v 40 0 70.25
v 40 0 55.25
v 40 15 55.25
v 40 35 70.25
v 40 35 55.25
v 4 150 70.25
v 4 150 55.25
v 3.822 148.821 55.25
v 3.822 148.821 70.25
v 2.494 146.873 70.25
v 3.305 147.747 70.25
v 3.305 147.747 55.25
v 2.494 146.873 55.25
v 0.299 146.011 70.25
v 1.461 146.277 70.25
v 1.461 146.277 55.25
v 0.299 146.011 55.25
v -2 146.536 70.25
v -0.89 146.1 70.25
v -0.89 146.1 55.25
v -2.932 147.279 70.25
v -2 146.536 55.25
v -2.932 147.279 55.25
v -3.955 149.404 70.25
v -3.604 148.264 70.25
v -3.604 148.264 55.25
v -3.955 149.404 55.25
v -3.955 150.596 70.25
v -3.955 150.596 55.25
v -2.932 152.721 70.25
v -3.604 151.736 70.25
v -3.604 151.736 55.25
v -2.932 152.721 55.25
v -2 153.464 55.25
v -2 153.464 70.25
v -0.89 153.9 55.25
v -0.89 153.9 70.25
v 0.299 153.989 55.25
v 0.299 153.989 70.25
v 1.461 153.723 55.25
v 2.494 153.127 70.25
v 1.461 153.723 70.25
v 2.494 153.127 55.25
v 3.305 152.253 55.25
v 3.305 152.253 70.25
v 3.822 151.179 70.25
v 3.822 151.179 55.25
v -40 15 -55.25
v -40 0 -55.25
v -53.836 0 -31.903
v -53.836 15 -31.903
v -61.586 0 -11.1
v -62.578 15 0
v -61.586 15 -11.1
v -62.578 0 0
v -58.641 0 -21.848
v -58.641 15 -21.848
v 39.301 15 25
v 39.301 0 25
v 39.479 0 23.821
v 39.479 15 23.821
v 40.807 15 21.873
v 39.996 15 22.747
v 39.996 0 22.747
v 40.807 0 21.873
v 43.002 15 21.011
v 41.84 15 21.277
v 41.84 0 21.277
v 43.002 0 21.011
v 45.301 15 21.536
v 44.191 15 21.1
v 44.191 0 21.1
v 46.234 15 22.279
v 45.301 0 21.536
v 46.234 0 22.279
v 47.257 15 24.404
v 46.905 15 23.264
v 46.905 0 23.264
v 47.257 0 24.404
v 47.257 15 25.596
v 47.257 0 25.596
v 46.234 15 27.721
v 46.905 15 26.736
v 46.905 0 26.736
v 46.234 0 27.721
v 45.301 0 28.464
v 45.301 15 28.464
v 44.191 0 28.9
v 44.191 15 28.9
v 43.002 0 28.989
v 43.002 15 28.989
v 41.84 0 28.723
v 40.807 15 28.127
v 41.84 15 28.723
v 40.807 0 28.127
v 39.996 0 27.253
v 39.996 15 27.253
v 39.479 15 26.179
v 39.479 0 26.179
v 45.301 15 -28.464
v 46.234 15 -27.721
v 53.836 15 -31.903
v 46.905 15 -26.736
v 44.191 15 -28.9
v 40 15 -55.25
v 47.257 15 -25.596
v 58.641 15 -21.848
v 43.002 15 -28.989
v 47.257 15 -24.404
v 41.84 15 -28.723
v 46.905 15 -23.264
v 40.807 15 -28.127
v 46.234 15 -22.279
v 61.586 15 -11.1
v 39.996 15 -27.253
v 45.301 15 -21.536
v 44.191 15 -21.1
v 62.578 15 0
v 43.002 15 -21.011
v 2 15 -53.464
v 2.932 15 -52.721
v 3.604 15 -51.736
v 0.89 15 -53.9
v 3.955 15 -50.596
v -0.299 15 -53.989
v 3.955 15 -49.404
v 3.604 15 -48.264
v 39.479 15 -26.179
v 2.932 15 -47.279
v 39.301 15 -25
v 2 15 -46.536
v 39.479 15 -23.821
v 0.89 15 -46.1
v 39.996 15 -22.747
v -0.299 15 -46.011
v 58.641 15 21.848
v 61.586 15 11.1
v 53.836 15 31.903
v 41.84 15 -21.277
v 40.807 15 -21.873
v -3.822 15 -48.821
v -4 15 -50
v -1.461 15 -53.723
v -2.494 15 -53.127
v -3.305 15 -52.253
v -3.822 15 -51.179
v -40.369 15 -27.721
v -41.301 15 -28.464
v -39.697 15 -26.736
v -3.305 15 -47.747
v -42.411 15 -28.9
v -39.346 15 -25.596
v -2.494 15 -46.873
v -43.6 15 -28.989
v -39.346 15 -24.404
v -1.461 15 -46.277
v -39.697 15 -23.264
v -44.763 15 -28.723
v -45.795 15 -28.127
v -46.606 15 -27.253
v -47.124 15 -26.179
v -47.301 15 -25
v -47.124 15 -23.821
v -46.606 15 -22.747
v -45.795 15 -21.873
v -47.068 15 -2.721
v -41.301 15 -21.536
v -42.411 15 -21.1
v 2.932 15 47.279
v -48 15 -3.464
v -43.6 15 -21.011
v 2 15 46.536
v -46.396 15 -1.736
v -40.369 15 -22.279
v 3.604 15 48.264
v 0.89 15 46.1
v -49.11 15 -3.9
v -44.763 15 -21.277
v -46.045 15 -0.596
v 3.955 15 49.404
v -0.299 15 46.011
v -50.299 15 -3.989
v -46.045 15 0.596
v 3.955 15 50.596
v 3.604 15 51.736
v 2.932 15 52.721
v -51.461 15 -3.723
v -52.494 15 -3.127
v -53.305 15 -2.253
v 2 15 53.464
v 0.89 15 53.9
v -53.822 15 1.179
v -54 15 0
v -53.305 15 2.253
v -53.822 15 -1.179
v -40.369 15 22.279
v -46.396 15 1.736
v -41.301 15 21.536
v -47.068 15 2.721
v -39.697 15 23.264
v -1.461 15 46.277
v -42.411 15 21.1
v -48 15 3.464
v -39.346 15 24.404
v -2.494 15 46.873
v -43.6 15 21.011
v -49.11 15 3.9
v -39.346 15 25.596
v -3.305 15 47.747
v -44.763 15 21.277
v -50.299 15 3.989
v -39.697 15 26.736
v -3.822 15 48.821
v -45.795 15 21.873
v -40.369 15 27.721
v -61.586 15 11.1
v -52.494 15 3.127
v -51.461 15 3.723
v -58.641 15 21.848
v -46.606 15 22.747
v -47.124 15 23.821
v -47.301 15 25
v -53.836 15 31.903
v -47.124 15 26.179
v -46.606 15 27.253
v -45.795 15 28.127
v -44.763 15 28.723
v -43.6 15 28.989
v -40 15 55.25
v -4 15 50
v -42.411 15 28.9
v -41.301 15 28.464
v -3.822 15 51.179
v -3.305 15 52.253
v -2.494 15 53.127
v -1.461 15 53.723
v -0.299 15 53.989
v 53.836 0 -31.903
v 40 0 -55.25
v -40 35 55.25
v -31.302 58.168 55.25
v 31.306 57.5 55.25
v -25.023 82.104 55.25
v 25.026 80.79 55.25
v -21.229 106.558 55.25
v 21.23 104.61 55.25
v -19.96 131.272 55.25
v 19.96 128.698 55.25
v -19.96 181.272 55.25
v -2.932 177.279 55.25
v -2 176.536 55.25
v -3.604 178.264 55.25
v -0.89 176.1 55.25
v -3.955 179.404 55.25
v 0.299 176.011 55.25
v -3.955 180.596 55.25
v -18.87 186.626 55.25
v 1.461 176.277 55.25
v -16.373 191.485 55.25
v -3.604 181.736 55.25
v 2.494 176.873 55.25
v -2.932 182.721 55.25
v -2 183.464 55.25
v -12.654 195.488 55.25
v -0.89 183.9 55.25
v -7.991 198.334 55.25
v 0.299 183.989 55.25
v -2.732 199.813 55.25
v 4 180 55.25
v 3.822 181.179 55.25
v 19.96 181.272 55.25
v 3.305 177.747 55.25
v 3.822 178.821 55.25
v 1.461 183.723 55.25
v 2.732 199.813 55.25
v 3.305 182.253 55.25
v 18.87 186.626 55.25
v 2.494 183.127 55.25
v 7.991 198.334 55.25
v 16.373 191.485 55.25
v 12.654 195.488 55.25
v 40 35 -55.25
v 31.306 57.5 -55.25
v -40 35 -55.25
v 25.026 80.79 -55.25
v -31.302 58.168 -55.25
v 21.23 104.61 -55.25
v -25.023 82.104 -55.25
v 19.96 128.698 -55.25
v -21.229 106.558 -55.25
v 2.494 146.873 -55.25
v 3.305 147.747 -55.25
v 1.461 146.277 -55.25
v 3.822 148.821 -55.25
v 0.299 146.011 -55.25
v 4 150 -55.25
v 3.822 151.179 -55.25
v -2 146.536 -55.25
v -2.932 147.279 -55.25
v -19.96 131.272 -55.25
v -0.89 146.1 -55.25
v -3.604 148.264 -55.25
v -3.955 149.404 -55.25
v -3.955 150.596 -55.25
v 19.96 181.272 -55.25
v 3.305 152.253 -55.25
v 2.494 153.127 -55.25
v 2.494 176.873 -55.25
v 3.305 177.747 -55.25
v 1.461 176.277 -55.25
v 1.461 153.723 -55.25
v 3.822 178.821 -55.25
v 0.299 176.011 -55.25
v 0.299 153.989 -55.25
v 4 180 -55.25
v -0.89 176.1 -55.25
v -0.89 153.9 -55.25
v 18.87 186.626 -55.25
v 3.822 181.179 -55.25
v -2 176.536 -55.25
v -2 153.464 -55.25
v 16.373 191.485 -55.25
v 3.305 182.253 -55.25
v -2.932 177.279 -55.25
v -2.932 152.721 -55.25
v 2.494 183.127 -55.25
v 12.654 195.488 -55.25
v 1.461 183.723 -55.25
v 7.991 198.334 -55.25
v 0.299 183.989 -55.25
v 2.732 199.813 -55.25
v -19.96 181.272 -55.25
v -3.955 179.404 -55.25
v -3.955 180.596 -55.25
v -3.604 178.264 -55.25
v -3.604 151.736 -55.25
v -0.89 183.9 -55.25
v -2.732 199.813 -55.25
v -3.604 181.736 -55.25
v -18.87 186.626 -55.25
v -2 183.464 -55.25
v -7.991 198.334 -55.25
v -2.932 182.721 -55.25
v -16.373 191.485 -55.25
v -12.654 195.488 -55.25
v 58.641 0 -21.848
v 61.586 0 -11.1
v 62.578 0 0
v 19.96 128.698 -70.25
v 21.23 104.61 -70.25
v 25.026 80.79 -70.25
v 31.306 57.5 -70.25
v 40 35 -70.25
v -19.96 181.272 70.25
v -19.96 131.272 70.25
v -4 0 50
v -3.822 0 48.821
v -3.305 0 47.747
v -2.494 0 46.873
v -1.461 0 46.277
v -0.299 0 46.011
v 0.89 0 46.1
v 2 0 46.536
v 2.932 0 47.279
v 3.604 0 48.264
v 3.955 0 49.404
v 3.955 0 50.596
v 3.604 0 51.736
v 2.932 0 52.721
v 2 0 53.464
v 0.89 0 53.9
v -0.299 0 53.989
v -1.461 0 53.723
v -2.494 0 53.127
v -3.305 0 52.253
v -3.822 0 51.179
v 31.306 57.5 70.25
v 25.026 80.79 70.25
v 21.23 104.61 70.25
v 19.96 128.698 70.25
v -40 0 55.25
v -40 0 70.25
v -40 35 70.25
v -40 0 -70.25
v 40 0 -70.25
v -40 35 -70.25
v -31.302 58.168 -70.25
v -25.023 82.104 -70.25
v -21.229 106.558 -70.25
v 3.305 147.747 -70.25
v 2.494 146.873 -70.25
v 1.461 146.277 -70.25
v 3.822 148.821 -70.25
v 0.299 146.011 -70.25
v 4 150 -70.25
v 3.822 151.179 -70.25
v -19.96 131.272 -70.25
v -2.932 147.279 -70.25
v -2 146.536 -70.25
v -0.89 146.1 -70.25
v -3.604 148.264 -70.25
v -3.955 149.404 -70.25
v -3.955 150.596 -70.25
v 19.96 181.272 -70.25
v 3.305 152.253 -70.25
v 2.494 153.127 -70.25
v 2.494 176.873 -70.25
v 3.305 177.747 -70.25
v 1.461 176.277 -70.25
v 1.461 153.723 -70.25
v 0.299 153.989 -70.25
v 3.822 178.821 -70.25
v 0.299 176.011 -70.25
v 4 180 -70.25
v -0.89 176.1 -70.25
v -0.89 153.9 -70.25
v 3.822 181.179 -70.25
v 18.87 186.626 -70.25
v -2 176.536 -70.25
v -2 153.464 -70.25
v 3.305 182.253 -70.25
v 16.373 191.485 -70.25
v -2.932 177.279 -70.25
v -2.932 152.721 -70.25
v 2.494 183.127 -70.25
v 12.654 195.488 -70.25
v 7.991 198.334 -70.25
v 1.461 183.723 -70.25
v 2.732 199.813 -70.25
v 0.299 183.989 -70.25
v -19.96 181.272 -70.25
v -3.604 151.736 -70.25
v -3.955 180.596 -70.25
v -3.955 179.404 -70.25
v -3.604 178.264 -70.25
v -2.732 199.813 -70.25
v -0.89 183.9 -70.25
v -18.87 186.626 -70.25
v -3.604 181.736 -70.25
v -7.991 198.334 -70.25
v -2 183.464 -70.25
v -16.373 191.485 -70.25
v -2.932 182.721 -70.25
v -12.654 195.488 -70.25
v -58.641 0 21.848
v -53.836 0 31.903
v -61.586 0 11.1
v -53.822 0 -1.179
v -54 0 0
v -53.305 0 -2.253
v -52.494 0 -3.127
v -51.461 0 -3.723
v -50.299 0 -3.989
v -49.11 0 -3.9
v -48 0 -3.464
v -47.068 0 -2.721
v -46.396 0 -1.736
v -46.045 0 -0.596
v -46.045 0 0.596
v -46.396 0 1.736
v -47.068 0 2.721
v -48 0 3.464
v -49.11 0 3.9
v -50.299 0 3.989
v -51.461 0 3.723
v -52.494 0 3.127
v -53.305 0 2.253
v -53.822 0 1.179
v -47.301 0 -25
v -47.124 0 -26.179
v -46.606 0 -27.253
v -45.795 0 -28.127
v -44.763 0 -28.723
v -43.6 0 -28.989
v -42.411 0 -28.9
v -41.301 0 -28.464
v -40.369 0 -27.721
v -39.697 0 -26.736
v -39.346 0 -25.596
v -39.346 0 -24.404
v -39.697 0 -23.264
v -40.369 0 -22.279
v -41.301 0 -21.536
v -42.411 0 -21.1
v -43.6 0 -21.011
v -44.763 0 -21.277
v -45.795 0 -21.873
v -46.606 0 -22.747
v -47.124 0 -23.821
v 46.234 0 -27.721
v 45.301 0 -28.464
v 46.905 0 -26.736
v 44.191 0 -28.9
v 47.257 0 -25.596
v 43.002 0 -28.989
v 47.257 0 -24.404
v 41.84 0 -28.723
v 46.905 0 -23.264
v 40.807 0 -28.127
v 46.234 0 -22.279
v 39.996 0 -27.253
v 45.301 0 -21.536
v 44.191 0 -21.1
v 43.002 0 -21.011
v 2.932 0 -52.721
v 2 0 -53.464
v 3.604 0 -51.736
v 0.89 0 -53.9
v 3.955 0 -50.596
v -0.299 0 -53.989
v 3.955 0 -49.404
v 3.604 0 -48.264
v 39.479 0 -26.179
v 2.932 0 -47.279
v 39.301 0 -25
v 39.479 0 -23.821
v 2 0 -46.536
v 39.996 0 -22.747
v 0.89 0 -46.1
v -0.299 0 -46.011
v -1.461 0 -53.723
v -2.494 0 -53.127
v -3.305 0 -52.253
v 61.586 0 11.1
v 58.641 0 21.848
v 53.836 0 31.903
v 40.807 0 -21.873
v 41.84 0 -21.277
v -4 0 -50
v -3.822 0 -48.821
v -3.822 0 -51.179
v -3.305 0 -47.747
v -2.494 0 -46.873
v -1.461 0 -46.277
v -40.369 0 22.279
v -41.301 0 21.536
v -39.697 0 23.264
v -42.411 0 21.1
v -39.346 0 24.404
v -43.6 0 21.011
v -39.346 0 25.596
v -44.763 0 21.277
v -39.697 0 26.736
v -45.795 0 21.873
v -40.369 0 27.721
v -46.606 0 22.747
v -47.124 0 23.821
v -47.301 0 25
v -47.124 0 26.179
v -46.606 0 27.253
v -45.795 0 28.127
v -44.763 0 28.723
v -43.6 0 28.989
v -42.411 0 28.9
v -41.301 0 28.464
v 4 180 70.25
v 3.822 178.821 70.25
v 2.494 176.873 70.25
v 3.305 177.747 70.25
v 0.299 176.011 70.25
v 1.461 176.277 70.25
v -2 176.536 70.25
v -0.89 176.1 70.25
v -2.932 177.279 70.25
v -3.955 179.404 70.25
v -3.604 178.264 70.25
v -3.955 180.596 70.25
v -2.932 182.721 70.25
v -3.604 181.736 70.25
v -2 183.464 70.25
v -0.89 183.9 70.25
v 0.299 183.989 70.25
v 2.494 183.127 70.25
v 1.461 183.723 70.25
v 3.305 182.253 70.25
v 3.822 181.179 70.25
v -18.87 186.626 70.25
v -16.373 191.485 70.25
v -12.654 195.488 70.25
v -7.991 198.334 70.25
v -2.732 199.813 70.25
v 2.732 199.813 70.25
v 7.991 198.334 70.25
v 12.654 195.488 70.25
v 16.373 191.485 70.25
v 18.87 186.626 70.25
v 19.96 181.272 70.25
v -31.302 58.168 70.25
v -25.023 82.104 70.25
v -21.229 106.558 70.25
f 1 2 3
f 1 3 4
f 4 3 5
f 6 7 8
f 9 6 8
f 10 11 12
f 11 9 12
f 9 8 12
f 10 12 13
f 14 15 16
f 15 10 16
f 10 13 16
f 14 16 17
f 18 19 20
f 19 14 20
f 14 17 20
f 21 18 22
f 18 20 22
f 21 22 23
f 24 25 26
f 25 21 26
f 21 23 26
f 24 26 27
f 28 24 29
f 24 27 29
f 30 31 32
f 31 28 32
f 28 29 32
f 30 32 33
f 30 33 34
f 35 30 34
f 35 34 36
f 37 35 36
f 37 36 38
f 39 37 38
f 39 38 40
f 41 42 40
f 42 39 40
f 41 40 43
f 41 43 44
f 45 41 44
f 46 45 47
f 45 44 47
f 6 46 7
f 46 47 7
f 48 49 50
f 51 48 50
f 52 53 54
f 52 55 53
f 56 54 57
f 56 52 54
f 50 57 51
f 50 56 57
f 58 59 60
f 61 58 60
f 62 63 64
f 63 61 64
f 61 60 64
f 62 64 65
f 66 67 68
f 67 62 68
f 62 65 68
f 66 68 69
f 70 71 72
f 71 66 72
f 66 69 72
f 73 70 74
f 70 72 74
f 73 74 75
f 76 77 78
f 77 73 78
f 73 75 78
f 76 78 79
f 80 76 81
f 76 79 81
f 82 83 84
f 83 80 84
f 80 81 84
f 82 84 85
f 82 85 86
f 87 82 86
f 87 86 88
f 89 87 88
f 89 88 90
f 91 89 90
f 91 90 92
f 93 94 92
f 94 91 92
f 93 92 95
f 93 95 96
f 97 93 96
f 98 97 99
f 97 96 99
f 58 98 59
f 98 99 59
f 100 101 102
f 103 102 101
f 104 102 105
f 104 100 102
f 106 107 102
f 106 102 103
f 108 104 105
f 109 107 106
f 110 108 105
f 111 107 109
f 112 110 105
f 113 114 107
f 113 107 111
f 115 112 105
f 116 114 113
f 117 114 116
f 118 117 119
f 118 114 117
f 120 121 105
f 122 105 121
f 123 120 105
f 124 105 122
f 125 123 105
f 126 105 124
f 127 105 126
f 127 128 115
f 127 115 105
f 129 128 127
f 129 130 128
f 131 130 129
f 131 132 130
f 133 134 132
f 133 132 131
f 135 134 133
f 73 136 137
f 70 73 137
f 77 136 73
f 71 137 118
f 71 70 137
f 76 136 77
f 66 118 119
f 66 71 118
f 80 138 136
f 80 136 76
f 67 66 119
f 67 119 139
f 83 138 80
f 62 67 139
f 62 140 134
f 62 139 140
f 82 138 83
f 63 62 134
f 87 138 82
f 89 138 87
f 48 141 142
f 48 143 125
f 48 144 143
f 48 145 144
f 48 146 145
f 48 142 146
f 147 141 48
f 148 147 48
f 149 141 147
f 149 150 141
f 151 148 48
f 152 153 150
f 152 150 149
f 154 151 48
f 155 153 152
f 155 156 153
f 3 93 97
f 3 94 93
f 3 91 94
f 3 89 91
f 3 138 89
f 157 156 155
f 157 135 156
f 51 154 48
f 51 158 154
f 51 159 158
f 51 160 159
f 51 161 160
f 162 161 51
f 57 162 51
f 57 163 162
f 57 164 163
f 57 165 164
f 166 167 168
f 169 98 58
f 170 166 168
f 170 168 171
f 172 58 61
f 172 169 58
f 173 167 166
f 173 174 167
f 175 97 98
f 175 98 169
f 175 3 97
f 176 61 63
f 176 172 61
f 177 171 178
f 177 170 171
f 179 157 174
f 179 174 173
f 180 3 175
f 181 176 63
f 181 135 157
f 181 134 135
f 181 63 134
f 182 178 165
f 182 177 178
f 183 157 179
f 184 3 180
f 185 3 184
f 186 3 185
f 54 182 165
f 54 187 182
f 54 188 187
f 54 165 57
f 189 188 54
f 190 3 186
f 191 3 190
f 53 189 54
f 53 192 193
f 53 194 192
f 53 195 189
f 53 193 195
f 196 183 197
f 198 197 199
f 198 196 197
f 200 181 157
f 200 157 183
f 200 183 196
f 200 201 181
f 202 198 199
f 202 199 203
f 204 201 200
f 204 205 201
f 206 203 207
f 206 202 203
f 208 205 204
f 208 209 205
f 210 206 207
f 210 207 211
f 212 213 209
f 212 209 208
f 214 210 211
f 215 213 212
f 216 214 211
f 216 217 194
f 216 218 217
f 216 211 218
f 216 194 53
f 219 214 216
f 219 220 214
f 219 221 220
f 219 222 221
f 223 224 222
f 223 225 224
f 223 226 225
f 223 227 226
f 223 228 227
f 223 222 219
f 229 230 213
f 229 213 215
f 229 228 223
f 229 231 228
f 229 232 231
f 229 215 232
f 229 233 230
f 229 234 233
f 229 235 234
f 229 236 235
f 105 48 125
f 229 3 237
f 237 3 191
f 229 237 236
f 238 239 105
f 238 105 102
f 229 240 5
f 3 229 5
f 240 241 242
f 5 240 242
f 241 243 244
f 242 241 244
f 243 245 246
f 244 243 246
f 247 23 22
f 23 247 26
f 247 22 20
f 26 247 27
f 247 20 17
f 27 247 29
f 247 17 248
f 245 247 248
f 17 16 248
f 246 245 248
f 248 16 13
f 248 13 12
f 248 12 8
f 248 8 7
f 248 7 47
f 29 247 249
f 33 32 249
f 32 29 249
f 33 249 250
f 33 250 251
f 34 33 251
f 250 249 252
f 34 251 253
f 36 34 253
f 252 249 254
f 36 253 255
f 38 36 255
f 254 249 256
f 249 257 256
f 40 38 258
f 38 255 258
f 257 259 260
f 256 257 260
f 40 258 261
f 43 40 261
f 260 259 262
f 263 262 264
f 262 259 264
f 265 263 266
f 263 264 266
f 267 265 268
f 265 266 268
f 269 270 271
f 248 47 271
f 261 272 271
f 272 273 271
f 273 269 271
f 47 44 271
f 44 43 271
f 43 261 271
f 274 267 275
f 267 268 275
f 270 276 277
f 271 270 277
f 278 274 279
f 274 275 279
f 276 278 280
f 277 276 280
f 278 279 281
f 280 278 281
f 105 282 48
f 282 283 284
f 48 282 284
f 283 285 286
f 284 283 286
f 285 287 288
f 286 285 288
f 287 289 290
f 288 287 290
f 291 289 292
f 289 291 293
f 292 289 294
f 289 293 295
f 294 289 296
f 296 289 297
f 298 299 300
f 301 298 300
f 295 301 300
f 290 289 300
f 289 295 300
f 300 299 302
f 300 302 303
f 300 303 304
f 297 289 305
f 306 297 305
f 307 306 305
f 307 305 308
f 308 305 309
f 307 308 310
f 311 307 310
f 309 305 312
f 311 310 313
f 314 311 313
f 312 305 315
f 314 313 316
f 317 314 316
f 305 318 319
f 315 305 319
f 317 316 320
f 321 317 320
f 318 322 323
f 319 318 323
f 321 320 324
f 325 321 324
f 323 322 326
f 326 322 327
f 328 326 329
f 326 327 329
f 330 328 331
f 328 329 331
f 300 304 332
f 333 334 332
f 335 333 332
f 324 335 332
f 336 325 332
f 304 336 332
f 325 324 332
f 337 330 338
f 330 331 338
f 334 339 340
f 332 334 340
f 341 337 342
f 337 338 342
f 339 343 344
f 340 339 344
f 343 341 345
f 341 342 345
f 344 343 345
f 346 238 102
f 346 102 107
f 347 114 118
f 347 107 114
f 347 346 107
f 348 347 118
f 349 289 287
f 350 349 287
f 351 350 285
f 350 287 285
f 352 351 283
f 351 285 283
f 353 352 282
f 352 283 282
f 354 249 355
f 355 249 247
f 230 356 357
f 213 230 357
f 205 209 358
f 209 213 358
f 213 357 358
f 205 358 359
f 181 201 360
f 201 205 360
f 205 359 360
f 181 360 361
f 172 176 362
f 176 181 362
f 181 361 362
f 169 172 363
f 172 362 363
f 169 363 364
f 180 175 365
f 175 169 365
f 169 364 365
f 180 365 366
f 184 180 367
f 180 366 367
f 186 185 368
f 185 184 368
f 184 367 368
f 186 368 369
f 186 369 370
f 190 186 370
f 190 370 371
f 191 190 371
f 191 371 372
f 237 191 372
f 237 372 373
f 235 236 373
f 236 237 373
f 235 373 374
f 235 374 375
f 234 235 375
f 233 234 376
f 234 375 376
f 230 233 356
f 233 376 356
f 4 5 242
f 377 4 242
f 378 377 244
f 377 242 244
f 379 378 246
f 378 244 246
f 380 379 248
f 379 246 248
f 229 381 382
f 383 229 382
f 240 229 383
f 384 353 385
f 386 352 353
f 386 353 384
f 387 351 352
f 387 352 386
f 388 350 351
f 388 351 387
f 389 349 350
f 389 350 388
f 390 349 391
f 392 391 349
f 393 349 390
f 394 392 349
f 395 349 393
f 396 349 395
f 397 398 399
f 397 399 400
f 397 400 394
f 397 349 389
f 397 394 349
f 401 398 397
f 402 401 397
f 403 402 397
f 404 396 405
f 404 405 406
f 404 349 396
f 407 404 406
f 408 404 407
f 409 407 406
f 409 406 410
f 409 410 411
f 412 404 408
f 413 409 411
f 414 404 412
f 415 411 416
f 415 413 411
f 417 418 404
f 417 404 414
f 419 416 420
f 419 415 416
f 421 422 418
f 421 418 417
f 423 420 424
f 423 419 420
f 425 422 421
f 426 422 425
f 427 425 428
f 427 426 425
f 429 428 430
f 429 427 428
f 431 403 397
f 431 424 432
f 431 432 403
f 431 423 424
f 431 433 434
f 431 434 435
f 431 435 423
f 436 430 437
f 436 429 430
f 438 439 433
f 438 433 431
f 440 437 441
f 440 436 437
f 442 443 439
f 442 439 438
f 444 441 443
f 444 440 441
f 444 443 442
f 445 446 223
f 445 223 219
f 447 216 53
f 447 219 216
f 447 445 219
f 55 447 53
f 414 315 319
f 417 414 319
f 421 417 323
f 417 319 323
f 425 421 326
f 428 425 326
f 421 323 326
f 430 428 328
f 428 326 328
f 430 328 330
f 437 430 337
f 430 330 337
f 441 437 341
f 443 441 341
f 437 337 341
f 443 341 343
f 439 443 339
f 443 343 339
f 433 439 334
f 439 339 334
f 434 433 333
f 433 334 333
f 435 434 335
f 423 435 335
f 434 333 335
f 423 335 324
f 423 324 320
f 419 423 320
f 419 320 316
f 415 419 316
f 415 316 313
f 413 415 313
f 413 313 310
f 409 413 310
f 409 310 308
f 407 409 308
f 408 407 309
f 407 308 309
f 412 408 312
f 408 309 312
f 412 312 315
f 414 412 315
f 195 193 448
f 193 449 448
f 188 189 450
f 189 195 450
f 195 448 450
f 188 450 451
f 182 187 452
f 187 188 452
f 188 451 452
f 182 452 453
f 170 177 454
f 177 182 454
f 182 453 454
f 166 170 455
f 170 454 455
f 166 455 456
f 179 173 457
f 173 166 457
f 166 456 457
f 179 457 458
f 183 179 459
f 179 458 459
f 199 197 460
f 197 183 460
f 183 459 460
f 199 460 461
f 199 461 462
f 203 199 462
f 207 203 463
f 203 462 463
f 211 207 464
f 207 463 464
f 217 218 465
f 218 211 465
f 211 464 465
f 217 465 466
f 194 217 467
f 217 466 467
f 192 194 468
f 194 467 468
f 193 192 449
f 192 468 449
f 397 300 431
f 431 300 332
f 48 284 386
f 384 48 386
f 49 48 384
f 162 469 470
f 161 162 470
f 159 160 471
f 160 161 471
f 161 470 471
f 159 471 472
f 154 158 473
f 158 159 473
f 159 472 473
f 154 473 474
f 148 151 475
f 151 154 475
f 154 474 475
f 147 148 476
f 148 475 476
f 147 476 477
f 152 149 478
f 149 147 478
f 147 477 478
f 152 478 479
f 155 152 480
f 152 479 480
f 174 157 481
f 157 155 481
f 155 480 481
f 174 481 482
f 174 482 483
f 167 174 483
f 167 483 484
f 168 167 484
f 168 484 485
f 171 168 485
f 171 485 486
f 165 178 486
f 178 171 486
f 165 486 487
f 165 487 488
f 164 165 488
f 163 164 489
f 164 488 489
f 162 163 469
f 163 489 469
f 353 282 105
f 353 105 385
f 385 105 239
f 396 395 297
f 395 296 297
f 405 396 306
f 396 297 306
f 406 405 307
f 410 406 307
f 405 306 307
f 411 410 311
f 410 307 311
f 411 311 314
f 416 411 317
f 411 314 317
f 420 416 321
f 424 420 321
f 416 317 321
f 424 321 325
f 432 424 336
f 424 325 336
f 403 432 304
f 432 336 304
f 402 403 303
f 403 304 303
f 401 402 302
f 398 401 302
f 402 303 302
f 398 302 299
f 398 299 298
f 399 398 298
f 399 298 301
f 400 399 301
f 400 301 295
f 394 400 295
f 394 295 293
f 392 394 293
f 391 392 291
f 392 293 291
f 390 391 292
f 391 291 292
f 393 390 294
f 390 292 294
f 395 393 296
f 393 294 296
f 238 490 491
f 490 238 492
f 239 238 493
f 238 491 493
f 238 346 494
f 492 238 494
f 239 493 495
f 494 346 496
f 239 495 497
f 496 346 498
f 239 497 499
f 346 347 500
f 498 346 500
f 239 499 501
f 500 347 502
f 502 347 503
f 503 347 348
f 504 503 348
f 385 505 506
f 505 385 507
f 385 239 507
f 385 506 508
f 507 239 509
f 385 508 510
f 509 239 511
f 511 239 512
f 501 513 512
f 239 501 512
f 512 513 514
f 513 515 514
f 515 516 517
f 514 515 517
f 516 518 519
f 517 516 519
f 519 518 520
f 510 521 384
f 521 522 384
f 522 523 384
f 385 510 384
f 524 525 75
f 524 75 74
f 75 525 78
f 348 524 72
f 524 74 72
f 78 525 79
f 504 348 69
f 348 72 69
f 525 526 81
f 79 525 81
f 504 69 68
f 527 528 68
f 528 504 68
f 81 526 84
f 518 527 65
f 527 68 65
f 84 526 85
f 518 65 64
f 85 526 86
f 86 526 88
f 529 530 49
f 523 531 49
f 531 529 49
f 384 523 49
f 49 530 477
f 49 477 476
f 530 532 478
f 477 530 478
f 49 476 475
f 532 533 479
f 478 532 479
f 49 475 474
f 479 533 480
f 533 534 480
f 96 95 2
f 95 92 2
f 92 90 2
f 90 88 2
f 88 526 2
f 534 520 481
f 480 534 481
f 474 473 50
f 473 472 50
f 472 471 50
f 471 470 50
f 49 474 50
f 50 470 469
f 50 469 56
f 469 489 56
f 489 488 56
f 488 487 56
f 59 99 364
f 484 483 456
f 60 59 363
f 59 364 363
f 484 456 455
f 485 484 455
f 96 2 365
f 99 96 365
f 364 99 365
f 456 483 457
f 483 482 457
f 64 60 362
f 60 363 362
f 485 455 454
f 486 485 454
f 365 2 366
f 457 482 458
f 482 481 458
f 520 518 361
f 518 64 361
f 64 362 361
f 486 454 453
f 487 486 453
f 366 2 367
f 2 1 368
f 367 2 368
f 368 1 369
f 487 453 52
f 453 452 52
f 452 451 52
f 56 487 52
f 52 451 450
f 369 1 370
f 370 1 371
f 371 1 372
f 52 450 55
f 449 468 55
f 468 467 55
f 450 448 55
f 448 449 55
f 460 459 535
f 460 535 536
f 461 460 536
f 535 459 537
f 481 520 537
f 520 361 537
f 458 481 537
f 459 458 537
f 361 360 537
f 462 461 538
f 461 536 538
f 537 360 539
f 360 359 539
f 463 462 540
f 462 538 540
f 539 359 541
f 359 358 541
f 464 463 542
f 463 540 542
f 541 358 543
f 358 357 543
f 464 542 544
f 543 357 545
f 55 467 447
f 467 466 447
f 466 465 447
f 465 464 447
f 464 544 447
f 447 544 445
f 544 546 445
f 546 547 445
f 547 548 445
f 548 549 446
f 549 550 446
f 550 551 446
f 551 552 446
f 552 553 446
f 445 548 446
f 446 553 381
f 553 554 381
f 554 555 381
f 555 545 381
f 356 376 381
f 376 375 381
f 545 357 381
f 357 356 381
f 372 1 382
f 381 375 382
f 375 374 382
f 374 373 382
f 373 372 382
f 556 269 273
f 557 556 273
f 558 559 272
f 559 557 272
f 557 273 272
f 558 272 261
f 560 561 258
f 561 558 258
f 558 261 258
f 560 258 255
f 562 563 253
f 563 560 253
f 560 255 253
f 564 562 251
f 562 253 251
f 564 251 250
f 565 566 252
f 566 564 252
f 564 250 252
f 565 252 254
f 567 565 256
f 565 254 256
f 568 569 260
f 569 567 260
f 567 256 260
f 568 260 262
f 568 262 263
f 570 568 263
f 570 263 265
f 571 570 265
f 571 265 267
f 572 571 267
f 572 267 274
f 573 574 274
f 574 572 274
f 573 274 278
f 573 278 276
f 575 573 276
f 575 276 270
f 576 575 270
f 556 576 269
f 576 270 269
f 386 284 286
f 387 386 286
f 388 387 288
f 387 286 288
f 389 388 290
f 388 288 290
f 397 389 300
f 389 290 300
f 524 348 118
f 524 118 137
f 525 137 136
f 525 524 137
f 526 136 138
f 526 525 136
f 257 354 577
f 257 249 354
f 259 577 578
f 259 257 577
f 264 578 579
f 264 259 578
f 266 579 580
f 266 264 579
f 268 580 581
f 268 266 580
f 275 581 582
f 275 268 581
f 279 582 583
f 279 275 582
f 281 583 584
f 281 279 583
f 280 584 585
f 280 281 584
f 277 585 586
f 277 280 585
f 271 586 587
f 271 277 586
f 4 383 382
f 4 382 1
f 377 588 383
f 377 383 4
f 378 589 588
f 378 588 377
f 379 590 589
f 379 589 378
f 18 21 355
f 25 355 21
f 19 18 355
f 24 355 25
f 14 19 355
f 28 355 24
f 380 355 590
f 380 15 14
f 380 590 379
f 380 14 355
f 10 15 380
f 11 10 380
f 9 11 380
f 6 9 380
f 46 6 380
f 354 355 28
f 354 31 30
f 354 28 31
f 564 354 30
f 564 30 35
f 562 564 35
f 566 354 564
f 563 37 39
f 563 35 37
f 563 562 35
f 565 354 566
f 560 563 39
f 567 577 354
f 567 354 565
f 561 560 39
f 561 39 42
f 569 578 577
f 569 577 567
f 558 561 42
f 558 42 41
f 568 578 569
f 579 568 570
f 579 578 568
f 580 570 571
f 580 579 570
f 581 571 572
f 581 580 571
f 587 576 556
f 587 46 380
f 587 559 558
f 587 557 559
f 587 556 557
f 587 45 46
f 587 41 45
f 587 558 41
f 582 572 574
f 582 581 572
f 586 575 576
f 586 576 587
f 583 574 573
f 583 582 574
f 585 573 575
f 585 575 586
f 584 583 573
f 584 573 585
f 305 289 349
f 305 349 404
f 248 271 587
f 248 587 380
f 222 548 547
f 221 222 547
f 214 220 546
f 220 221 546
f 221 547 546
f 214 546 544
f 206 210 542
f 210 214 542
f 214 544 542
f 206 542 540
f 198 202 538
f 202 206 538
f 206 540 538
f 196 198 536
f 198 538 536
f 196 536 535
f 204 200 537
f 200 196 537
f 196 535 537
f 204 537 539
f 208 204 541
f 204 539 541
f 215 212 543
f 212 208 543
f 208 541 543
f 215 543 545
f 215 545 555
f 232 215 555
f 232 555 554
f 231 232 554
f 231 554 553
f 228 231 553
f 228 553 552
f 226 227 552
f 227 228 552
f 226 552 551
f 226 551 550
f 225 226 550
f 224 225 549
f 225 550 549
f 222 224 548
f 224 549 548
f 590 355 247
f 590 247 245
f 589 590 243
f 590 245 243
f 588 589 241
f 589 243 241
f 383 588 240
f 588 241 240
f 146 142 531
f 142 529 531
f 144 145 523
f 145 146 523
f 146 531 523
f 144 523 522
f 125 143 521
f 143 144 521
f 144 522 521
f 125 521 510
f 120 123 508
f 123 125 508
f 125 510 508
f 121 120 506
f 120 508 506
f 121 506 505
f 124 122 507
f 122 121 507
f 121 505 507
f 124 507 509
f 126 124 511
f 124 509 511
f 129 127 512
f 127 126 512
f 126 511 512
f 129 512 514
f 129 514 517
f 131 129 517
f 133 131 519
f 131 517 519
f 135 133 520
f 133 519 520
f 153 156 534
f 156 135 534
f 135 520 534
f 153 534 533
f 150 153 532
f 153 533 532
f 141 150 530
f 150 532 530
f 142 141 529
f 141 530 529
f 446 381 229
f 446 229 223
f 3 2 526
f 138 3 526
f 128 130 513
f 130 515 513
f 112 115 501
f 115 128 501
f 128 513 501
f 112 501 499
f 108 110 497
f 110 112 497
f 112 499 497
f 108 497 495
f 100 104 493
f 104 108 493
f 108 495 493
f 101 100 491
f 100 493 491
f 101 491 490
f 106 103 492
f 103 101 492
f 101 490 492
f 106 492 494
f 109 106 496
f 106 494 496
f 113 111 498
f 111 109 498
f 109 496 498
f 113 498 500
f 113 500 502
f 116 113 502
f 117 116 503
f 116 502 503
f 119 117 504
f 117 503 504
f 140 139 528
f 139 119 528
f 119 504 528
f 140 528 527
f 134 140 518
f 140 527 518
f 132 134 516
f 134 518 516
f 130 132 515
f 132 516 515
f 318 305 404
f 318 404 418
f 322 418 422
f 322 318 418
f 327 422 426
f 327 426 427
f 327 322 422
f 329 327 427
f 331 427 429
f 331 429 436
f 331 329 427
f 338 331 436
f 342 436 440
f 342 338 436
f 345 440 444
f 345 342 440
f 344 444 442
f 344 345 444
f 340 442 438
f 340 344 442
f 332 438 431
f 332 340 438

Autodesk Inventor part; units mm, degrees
ref_plane "YZ Plane" through (0, 0, 0) normal (1, 0, 0) x (0, 1, 0)
ref_plane "XZ Plane" through (0, 0, 0) normal (0, 1, 0) x (-1, 0, 0)
ref_plane "XY Plane" through (0, 0, 0) normal (0, 0, 1) x (1, 0, 0)
sketch "Sketch1" plane through (0, 0, 0) normal (0, 1, 0) x (-1, 0, 0)
  circle A0 centre (0, 0) radius 50 construction
  circle A1 centre (50, 0) radius 4
  line L0 (0, 0) -> (43.3013, -25) construction
  line L1 (0, 0) -> (50, 0) construction
  circle A2 centre (43.3013, -25) radius 4
  circle A3 centre (43.3013, 25) radius 4
  circle A4 centre (0, 50) radius 4
  circle A5 centre (-43.3013, 25) radius 4
  circle A6 centre (-43.3013, -25) radius 4
  circle A7 centre (0, -50) radius 4
  line L2 (25, 55.25) -> (-25, 55.25)
  arc A8 (-53.8355, 31.903) -> (-62.5784, 0) centre (0, 0) ccw
  arc A9 (62.5784, 0) -> (53.8355, 31.903) centre (0, 0) ccw
  line L3 (0, 55.25) -> (40, 55.25)
  line L4 (0, 55.25) -> (-40, 55.25)
  line L5 (40, 55.25) -> (53.8355, 31.903)
  line L6 (-40, 55.25) -> (-53.8355, 31.903)
  line L7 (62.5784, 0) -> (-62.5784, 0) construction
  arc A10 (-62.5784, 0) -> (-53.8355, -31.903) centre (0, 0) ccw
  arc A11 (53.8355, -31.903) -> (62.5784, 0) centre (0, 0) ccw
  line L8 (0, -55.25) -> (40, -55.25)
  line L9 (0, -55.25) -> (-40, -55.25)
  line L10 (40, -55.25) -> (53.8355, -31.903)
  line L11 (-40, -55.25) -> (-53.8355, -31.903)
  point P0 (-25, 55.25)
  dimension "d1" = 100
  dimension "d2" = 8
  dimension "d3" = 30
  dimension "d4" = 8
  dimension "d7" = 360
  dimension "d35" = 40
  dimension "d36" = 40
  dimension "d49" = 110.5
extrude "Extrusion1" add sketch "Sketch1" along normal blind 15
sketch "Sketch4" plane through (-40, 0, 55.25) normal (0, 0, 1) x (1, 0, 0)
  line L0 (40, 200) -> (40, 184) construction
  line L1 (40, 184) -> (40, 180) construction
  circle A0 centre (40, 180) radius 4
  line L2 (40, 180) -> (40, 150) construction
  circle A1 centre (40, 150) radius 4
  arc A2 (59.9595, 181.2724) -> (20.0405, 181.2724) centre (40, 180) ccw
  line L3 (0, 0) -> (0, 15) projected
  line L4 (0, 15) -> (0, 0)
  line L5 (80, 0) -> (80, 15) projected
  line L6 (0, 0) -> (80, 0)
  line L7 (80, 0) -> (80, 15)
  line L8 (40, 0) -> (40, 15) construction
  line L9 (40, 146) -> (40, 200) construction
  line L10 (20.0405, 181.2724) -> (20.0405, 131.2724)
  line L11 (0, 15) -> (0, 35)
  line L12 (59.9595, 181.2724) -> (59.9595, 128.6983)
  line L13 (0, 15) -> (80, 15) projected
  line L14 (80, 15) -> (80, 35)
  arc A3 (0, 35) -> (20.0405, 131.2724) centre (-221.2208, 131.2724) ccw
  arc A4 (59.9595, 128.6983) -> (80, 35) centre (289.0202, 128.6983) ccw
  dimension "d42" = 8
  dimension "d37" = 200
  dimension "d38" = 16
  dimension "d39" = 4
  dimension "d40" = 8
  dimension "d41" = 30
  dimension "d50" = 50
  dimension "d51" = 20
  dimension "d52" = 20
extrude "Extrusion3" add sketch "Sketch4" along normal blind 15
mirror "Mirror2" about plane through (0, 0, 0) normal (0, 0, 1) of "Extrusion3"
properties part number "MOUNTING-COUPLE"
